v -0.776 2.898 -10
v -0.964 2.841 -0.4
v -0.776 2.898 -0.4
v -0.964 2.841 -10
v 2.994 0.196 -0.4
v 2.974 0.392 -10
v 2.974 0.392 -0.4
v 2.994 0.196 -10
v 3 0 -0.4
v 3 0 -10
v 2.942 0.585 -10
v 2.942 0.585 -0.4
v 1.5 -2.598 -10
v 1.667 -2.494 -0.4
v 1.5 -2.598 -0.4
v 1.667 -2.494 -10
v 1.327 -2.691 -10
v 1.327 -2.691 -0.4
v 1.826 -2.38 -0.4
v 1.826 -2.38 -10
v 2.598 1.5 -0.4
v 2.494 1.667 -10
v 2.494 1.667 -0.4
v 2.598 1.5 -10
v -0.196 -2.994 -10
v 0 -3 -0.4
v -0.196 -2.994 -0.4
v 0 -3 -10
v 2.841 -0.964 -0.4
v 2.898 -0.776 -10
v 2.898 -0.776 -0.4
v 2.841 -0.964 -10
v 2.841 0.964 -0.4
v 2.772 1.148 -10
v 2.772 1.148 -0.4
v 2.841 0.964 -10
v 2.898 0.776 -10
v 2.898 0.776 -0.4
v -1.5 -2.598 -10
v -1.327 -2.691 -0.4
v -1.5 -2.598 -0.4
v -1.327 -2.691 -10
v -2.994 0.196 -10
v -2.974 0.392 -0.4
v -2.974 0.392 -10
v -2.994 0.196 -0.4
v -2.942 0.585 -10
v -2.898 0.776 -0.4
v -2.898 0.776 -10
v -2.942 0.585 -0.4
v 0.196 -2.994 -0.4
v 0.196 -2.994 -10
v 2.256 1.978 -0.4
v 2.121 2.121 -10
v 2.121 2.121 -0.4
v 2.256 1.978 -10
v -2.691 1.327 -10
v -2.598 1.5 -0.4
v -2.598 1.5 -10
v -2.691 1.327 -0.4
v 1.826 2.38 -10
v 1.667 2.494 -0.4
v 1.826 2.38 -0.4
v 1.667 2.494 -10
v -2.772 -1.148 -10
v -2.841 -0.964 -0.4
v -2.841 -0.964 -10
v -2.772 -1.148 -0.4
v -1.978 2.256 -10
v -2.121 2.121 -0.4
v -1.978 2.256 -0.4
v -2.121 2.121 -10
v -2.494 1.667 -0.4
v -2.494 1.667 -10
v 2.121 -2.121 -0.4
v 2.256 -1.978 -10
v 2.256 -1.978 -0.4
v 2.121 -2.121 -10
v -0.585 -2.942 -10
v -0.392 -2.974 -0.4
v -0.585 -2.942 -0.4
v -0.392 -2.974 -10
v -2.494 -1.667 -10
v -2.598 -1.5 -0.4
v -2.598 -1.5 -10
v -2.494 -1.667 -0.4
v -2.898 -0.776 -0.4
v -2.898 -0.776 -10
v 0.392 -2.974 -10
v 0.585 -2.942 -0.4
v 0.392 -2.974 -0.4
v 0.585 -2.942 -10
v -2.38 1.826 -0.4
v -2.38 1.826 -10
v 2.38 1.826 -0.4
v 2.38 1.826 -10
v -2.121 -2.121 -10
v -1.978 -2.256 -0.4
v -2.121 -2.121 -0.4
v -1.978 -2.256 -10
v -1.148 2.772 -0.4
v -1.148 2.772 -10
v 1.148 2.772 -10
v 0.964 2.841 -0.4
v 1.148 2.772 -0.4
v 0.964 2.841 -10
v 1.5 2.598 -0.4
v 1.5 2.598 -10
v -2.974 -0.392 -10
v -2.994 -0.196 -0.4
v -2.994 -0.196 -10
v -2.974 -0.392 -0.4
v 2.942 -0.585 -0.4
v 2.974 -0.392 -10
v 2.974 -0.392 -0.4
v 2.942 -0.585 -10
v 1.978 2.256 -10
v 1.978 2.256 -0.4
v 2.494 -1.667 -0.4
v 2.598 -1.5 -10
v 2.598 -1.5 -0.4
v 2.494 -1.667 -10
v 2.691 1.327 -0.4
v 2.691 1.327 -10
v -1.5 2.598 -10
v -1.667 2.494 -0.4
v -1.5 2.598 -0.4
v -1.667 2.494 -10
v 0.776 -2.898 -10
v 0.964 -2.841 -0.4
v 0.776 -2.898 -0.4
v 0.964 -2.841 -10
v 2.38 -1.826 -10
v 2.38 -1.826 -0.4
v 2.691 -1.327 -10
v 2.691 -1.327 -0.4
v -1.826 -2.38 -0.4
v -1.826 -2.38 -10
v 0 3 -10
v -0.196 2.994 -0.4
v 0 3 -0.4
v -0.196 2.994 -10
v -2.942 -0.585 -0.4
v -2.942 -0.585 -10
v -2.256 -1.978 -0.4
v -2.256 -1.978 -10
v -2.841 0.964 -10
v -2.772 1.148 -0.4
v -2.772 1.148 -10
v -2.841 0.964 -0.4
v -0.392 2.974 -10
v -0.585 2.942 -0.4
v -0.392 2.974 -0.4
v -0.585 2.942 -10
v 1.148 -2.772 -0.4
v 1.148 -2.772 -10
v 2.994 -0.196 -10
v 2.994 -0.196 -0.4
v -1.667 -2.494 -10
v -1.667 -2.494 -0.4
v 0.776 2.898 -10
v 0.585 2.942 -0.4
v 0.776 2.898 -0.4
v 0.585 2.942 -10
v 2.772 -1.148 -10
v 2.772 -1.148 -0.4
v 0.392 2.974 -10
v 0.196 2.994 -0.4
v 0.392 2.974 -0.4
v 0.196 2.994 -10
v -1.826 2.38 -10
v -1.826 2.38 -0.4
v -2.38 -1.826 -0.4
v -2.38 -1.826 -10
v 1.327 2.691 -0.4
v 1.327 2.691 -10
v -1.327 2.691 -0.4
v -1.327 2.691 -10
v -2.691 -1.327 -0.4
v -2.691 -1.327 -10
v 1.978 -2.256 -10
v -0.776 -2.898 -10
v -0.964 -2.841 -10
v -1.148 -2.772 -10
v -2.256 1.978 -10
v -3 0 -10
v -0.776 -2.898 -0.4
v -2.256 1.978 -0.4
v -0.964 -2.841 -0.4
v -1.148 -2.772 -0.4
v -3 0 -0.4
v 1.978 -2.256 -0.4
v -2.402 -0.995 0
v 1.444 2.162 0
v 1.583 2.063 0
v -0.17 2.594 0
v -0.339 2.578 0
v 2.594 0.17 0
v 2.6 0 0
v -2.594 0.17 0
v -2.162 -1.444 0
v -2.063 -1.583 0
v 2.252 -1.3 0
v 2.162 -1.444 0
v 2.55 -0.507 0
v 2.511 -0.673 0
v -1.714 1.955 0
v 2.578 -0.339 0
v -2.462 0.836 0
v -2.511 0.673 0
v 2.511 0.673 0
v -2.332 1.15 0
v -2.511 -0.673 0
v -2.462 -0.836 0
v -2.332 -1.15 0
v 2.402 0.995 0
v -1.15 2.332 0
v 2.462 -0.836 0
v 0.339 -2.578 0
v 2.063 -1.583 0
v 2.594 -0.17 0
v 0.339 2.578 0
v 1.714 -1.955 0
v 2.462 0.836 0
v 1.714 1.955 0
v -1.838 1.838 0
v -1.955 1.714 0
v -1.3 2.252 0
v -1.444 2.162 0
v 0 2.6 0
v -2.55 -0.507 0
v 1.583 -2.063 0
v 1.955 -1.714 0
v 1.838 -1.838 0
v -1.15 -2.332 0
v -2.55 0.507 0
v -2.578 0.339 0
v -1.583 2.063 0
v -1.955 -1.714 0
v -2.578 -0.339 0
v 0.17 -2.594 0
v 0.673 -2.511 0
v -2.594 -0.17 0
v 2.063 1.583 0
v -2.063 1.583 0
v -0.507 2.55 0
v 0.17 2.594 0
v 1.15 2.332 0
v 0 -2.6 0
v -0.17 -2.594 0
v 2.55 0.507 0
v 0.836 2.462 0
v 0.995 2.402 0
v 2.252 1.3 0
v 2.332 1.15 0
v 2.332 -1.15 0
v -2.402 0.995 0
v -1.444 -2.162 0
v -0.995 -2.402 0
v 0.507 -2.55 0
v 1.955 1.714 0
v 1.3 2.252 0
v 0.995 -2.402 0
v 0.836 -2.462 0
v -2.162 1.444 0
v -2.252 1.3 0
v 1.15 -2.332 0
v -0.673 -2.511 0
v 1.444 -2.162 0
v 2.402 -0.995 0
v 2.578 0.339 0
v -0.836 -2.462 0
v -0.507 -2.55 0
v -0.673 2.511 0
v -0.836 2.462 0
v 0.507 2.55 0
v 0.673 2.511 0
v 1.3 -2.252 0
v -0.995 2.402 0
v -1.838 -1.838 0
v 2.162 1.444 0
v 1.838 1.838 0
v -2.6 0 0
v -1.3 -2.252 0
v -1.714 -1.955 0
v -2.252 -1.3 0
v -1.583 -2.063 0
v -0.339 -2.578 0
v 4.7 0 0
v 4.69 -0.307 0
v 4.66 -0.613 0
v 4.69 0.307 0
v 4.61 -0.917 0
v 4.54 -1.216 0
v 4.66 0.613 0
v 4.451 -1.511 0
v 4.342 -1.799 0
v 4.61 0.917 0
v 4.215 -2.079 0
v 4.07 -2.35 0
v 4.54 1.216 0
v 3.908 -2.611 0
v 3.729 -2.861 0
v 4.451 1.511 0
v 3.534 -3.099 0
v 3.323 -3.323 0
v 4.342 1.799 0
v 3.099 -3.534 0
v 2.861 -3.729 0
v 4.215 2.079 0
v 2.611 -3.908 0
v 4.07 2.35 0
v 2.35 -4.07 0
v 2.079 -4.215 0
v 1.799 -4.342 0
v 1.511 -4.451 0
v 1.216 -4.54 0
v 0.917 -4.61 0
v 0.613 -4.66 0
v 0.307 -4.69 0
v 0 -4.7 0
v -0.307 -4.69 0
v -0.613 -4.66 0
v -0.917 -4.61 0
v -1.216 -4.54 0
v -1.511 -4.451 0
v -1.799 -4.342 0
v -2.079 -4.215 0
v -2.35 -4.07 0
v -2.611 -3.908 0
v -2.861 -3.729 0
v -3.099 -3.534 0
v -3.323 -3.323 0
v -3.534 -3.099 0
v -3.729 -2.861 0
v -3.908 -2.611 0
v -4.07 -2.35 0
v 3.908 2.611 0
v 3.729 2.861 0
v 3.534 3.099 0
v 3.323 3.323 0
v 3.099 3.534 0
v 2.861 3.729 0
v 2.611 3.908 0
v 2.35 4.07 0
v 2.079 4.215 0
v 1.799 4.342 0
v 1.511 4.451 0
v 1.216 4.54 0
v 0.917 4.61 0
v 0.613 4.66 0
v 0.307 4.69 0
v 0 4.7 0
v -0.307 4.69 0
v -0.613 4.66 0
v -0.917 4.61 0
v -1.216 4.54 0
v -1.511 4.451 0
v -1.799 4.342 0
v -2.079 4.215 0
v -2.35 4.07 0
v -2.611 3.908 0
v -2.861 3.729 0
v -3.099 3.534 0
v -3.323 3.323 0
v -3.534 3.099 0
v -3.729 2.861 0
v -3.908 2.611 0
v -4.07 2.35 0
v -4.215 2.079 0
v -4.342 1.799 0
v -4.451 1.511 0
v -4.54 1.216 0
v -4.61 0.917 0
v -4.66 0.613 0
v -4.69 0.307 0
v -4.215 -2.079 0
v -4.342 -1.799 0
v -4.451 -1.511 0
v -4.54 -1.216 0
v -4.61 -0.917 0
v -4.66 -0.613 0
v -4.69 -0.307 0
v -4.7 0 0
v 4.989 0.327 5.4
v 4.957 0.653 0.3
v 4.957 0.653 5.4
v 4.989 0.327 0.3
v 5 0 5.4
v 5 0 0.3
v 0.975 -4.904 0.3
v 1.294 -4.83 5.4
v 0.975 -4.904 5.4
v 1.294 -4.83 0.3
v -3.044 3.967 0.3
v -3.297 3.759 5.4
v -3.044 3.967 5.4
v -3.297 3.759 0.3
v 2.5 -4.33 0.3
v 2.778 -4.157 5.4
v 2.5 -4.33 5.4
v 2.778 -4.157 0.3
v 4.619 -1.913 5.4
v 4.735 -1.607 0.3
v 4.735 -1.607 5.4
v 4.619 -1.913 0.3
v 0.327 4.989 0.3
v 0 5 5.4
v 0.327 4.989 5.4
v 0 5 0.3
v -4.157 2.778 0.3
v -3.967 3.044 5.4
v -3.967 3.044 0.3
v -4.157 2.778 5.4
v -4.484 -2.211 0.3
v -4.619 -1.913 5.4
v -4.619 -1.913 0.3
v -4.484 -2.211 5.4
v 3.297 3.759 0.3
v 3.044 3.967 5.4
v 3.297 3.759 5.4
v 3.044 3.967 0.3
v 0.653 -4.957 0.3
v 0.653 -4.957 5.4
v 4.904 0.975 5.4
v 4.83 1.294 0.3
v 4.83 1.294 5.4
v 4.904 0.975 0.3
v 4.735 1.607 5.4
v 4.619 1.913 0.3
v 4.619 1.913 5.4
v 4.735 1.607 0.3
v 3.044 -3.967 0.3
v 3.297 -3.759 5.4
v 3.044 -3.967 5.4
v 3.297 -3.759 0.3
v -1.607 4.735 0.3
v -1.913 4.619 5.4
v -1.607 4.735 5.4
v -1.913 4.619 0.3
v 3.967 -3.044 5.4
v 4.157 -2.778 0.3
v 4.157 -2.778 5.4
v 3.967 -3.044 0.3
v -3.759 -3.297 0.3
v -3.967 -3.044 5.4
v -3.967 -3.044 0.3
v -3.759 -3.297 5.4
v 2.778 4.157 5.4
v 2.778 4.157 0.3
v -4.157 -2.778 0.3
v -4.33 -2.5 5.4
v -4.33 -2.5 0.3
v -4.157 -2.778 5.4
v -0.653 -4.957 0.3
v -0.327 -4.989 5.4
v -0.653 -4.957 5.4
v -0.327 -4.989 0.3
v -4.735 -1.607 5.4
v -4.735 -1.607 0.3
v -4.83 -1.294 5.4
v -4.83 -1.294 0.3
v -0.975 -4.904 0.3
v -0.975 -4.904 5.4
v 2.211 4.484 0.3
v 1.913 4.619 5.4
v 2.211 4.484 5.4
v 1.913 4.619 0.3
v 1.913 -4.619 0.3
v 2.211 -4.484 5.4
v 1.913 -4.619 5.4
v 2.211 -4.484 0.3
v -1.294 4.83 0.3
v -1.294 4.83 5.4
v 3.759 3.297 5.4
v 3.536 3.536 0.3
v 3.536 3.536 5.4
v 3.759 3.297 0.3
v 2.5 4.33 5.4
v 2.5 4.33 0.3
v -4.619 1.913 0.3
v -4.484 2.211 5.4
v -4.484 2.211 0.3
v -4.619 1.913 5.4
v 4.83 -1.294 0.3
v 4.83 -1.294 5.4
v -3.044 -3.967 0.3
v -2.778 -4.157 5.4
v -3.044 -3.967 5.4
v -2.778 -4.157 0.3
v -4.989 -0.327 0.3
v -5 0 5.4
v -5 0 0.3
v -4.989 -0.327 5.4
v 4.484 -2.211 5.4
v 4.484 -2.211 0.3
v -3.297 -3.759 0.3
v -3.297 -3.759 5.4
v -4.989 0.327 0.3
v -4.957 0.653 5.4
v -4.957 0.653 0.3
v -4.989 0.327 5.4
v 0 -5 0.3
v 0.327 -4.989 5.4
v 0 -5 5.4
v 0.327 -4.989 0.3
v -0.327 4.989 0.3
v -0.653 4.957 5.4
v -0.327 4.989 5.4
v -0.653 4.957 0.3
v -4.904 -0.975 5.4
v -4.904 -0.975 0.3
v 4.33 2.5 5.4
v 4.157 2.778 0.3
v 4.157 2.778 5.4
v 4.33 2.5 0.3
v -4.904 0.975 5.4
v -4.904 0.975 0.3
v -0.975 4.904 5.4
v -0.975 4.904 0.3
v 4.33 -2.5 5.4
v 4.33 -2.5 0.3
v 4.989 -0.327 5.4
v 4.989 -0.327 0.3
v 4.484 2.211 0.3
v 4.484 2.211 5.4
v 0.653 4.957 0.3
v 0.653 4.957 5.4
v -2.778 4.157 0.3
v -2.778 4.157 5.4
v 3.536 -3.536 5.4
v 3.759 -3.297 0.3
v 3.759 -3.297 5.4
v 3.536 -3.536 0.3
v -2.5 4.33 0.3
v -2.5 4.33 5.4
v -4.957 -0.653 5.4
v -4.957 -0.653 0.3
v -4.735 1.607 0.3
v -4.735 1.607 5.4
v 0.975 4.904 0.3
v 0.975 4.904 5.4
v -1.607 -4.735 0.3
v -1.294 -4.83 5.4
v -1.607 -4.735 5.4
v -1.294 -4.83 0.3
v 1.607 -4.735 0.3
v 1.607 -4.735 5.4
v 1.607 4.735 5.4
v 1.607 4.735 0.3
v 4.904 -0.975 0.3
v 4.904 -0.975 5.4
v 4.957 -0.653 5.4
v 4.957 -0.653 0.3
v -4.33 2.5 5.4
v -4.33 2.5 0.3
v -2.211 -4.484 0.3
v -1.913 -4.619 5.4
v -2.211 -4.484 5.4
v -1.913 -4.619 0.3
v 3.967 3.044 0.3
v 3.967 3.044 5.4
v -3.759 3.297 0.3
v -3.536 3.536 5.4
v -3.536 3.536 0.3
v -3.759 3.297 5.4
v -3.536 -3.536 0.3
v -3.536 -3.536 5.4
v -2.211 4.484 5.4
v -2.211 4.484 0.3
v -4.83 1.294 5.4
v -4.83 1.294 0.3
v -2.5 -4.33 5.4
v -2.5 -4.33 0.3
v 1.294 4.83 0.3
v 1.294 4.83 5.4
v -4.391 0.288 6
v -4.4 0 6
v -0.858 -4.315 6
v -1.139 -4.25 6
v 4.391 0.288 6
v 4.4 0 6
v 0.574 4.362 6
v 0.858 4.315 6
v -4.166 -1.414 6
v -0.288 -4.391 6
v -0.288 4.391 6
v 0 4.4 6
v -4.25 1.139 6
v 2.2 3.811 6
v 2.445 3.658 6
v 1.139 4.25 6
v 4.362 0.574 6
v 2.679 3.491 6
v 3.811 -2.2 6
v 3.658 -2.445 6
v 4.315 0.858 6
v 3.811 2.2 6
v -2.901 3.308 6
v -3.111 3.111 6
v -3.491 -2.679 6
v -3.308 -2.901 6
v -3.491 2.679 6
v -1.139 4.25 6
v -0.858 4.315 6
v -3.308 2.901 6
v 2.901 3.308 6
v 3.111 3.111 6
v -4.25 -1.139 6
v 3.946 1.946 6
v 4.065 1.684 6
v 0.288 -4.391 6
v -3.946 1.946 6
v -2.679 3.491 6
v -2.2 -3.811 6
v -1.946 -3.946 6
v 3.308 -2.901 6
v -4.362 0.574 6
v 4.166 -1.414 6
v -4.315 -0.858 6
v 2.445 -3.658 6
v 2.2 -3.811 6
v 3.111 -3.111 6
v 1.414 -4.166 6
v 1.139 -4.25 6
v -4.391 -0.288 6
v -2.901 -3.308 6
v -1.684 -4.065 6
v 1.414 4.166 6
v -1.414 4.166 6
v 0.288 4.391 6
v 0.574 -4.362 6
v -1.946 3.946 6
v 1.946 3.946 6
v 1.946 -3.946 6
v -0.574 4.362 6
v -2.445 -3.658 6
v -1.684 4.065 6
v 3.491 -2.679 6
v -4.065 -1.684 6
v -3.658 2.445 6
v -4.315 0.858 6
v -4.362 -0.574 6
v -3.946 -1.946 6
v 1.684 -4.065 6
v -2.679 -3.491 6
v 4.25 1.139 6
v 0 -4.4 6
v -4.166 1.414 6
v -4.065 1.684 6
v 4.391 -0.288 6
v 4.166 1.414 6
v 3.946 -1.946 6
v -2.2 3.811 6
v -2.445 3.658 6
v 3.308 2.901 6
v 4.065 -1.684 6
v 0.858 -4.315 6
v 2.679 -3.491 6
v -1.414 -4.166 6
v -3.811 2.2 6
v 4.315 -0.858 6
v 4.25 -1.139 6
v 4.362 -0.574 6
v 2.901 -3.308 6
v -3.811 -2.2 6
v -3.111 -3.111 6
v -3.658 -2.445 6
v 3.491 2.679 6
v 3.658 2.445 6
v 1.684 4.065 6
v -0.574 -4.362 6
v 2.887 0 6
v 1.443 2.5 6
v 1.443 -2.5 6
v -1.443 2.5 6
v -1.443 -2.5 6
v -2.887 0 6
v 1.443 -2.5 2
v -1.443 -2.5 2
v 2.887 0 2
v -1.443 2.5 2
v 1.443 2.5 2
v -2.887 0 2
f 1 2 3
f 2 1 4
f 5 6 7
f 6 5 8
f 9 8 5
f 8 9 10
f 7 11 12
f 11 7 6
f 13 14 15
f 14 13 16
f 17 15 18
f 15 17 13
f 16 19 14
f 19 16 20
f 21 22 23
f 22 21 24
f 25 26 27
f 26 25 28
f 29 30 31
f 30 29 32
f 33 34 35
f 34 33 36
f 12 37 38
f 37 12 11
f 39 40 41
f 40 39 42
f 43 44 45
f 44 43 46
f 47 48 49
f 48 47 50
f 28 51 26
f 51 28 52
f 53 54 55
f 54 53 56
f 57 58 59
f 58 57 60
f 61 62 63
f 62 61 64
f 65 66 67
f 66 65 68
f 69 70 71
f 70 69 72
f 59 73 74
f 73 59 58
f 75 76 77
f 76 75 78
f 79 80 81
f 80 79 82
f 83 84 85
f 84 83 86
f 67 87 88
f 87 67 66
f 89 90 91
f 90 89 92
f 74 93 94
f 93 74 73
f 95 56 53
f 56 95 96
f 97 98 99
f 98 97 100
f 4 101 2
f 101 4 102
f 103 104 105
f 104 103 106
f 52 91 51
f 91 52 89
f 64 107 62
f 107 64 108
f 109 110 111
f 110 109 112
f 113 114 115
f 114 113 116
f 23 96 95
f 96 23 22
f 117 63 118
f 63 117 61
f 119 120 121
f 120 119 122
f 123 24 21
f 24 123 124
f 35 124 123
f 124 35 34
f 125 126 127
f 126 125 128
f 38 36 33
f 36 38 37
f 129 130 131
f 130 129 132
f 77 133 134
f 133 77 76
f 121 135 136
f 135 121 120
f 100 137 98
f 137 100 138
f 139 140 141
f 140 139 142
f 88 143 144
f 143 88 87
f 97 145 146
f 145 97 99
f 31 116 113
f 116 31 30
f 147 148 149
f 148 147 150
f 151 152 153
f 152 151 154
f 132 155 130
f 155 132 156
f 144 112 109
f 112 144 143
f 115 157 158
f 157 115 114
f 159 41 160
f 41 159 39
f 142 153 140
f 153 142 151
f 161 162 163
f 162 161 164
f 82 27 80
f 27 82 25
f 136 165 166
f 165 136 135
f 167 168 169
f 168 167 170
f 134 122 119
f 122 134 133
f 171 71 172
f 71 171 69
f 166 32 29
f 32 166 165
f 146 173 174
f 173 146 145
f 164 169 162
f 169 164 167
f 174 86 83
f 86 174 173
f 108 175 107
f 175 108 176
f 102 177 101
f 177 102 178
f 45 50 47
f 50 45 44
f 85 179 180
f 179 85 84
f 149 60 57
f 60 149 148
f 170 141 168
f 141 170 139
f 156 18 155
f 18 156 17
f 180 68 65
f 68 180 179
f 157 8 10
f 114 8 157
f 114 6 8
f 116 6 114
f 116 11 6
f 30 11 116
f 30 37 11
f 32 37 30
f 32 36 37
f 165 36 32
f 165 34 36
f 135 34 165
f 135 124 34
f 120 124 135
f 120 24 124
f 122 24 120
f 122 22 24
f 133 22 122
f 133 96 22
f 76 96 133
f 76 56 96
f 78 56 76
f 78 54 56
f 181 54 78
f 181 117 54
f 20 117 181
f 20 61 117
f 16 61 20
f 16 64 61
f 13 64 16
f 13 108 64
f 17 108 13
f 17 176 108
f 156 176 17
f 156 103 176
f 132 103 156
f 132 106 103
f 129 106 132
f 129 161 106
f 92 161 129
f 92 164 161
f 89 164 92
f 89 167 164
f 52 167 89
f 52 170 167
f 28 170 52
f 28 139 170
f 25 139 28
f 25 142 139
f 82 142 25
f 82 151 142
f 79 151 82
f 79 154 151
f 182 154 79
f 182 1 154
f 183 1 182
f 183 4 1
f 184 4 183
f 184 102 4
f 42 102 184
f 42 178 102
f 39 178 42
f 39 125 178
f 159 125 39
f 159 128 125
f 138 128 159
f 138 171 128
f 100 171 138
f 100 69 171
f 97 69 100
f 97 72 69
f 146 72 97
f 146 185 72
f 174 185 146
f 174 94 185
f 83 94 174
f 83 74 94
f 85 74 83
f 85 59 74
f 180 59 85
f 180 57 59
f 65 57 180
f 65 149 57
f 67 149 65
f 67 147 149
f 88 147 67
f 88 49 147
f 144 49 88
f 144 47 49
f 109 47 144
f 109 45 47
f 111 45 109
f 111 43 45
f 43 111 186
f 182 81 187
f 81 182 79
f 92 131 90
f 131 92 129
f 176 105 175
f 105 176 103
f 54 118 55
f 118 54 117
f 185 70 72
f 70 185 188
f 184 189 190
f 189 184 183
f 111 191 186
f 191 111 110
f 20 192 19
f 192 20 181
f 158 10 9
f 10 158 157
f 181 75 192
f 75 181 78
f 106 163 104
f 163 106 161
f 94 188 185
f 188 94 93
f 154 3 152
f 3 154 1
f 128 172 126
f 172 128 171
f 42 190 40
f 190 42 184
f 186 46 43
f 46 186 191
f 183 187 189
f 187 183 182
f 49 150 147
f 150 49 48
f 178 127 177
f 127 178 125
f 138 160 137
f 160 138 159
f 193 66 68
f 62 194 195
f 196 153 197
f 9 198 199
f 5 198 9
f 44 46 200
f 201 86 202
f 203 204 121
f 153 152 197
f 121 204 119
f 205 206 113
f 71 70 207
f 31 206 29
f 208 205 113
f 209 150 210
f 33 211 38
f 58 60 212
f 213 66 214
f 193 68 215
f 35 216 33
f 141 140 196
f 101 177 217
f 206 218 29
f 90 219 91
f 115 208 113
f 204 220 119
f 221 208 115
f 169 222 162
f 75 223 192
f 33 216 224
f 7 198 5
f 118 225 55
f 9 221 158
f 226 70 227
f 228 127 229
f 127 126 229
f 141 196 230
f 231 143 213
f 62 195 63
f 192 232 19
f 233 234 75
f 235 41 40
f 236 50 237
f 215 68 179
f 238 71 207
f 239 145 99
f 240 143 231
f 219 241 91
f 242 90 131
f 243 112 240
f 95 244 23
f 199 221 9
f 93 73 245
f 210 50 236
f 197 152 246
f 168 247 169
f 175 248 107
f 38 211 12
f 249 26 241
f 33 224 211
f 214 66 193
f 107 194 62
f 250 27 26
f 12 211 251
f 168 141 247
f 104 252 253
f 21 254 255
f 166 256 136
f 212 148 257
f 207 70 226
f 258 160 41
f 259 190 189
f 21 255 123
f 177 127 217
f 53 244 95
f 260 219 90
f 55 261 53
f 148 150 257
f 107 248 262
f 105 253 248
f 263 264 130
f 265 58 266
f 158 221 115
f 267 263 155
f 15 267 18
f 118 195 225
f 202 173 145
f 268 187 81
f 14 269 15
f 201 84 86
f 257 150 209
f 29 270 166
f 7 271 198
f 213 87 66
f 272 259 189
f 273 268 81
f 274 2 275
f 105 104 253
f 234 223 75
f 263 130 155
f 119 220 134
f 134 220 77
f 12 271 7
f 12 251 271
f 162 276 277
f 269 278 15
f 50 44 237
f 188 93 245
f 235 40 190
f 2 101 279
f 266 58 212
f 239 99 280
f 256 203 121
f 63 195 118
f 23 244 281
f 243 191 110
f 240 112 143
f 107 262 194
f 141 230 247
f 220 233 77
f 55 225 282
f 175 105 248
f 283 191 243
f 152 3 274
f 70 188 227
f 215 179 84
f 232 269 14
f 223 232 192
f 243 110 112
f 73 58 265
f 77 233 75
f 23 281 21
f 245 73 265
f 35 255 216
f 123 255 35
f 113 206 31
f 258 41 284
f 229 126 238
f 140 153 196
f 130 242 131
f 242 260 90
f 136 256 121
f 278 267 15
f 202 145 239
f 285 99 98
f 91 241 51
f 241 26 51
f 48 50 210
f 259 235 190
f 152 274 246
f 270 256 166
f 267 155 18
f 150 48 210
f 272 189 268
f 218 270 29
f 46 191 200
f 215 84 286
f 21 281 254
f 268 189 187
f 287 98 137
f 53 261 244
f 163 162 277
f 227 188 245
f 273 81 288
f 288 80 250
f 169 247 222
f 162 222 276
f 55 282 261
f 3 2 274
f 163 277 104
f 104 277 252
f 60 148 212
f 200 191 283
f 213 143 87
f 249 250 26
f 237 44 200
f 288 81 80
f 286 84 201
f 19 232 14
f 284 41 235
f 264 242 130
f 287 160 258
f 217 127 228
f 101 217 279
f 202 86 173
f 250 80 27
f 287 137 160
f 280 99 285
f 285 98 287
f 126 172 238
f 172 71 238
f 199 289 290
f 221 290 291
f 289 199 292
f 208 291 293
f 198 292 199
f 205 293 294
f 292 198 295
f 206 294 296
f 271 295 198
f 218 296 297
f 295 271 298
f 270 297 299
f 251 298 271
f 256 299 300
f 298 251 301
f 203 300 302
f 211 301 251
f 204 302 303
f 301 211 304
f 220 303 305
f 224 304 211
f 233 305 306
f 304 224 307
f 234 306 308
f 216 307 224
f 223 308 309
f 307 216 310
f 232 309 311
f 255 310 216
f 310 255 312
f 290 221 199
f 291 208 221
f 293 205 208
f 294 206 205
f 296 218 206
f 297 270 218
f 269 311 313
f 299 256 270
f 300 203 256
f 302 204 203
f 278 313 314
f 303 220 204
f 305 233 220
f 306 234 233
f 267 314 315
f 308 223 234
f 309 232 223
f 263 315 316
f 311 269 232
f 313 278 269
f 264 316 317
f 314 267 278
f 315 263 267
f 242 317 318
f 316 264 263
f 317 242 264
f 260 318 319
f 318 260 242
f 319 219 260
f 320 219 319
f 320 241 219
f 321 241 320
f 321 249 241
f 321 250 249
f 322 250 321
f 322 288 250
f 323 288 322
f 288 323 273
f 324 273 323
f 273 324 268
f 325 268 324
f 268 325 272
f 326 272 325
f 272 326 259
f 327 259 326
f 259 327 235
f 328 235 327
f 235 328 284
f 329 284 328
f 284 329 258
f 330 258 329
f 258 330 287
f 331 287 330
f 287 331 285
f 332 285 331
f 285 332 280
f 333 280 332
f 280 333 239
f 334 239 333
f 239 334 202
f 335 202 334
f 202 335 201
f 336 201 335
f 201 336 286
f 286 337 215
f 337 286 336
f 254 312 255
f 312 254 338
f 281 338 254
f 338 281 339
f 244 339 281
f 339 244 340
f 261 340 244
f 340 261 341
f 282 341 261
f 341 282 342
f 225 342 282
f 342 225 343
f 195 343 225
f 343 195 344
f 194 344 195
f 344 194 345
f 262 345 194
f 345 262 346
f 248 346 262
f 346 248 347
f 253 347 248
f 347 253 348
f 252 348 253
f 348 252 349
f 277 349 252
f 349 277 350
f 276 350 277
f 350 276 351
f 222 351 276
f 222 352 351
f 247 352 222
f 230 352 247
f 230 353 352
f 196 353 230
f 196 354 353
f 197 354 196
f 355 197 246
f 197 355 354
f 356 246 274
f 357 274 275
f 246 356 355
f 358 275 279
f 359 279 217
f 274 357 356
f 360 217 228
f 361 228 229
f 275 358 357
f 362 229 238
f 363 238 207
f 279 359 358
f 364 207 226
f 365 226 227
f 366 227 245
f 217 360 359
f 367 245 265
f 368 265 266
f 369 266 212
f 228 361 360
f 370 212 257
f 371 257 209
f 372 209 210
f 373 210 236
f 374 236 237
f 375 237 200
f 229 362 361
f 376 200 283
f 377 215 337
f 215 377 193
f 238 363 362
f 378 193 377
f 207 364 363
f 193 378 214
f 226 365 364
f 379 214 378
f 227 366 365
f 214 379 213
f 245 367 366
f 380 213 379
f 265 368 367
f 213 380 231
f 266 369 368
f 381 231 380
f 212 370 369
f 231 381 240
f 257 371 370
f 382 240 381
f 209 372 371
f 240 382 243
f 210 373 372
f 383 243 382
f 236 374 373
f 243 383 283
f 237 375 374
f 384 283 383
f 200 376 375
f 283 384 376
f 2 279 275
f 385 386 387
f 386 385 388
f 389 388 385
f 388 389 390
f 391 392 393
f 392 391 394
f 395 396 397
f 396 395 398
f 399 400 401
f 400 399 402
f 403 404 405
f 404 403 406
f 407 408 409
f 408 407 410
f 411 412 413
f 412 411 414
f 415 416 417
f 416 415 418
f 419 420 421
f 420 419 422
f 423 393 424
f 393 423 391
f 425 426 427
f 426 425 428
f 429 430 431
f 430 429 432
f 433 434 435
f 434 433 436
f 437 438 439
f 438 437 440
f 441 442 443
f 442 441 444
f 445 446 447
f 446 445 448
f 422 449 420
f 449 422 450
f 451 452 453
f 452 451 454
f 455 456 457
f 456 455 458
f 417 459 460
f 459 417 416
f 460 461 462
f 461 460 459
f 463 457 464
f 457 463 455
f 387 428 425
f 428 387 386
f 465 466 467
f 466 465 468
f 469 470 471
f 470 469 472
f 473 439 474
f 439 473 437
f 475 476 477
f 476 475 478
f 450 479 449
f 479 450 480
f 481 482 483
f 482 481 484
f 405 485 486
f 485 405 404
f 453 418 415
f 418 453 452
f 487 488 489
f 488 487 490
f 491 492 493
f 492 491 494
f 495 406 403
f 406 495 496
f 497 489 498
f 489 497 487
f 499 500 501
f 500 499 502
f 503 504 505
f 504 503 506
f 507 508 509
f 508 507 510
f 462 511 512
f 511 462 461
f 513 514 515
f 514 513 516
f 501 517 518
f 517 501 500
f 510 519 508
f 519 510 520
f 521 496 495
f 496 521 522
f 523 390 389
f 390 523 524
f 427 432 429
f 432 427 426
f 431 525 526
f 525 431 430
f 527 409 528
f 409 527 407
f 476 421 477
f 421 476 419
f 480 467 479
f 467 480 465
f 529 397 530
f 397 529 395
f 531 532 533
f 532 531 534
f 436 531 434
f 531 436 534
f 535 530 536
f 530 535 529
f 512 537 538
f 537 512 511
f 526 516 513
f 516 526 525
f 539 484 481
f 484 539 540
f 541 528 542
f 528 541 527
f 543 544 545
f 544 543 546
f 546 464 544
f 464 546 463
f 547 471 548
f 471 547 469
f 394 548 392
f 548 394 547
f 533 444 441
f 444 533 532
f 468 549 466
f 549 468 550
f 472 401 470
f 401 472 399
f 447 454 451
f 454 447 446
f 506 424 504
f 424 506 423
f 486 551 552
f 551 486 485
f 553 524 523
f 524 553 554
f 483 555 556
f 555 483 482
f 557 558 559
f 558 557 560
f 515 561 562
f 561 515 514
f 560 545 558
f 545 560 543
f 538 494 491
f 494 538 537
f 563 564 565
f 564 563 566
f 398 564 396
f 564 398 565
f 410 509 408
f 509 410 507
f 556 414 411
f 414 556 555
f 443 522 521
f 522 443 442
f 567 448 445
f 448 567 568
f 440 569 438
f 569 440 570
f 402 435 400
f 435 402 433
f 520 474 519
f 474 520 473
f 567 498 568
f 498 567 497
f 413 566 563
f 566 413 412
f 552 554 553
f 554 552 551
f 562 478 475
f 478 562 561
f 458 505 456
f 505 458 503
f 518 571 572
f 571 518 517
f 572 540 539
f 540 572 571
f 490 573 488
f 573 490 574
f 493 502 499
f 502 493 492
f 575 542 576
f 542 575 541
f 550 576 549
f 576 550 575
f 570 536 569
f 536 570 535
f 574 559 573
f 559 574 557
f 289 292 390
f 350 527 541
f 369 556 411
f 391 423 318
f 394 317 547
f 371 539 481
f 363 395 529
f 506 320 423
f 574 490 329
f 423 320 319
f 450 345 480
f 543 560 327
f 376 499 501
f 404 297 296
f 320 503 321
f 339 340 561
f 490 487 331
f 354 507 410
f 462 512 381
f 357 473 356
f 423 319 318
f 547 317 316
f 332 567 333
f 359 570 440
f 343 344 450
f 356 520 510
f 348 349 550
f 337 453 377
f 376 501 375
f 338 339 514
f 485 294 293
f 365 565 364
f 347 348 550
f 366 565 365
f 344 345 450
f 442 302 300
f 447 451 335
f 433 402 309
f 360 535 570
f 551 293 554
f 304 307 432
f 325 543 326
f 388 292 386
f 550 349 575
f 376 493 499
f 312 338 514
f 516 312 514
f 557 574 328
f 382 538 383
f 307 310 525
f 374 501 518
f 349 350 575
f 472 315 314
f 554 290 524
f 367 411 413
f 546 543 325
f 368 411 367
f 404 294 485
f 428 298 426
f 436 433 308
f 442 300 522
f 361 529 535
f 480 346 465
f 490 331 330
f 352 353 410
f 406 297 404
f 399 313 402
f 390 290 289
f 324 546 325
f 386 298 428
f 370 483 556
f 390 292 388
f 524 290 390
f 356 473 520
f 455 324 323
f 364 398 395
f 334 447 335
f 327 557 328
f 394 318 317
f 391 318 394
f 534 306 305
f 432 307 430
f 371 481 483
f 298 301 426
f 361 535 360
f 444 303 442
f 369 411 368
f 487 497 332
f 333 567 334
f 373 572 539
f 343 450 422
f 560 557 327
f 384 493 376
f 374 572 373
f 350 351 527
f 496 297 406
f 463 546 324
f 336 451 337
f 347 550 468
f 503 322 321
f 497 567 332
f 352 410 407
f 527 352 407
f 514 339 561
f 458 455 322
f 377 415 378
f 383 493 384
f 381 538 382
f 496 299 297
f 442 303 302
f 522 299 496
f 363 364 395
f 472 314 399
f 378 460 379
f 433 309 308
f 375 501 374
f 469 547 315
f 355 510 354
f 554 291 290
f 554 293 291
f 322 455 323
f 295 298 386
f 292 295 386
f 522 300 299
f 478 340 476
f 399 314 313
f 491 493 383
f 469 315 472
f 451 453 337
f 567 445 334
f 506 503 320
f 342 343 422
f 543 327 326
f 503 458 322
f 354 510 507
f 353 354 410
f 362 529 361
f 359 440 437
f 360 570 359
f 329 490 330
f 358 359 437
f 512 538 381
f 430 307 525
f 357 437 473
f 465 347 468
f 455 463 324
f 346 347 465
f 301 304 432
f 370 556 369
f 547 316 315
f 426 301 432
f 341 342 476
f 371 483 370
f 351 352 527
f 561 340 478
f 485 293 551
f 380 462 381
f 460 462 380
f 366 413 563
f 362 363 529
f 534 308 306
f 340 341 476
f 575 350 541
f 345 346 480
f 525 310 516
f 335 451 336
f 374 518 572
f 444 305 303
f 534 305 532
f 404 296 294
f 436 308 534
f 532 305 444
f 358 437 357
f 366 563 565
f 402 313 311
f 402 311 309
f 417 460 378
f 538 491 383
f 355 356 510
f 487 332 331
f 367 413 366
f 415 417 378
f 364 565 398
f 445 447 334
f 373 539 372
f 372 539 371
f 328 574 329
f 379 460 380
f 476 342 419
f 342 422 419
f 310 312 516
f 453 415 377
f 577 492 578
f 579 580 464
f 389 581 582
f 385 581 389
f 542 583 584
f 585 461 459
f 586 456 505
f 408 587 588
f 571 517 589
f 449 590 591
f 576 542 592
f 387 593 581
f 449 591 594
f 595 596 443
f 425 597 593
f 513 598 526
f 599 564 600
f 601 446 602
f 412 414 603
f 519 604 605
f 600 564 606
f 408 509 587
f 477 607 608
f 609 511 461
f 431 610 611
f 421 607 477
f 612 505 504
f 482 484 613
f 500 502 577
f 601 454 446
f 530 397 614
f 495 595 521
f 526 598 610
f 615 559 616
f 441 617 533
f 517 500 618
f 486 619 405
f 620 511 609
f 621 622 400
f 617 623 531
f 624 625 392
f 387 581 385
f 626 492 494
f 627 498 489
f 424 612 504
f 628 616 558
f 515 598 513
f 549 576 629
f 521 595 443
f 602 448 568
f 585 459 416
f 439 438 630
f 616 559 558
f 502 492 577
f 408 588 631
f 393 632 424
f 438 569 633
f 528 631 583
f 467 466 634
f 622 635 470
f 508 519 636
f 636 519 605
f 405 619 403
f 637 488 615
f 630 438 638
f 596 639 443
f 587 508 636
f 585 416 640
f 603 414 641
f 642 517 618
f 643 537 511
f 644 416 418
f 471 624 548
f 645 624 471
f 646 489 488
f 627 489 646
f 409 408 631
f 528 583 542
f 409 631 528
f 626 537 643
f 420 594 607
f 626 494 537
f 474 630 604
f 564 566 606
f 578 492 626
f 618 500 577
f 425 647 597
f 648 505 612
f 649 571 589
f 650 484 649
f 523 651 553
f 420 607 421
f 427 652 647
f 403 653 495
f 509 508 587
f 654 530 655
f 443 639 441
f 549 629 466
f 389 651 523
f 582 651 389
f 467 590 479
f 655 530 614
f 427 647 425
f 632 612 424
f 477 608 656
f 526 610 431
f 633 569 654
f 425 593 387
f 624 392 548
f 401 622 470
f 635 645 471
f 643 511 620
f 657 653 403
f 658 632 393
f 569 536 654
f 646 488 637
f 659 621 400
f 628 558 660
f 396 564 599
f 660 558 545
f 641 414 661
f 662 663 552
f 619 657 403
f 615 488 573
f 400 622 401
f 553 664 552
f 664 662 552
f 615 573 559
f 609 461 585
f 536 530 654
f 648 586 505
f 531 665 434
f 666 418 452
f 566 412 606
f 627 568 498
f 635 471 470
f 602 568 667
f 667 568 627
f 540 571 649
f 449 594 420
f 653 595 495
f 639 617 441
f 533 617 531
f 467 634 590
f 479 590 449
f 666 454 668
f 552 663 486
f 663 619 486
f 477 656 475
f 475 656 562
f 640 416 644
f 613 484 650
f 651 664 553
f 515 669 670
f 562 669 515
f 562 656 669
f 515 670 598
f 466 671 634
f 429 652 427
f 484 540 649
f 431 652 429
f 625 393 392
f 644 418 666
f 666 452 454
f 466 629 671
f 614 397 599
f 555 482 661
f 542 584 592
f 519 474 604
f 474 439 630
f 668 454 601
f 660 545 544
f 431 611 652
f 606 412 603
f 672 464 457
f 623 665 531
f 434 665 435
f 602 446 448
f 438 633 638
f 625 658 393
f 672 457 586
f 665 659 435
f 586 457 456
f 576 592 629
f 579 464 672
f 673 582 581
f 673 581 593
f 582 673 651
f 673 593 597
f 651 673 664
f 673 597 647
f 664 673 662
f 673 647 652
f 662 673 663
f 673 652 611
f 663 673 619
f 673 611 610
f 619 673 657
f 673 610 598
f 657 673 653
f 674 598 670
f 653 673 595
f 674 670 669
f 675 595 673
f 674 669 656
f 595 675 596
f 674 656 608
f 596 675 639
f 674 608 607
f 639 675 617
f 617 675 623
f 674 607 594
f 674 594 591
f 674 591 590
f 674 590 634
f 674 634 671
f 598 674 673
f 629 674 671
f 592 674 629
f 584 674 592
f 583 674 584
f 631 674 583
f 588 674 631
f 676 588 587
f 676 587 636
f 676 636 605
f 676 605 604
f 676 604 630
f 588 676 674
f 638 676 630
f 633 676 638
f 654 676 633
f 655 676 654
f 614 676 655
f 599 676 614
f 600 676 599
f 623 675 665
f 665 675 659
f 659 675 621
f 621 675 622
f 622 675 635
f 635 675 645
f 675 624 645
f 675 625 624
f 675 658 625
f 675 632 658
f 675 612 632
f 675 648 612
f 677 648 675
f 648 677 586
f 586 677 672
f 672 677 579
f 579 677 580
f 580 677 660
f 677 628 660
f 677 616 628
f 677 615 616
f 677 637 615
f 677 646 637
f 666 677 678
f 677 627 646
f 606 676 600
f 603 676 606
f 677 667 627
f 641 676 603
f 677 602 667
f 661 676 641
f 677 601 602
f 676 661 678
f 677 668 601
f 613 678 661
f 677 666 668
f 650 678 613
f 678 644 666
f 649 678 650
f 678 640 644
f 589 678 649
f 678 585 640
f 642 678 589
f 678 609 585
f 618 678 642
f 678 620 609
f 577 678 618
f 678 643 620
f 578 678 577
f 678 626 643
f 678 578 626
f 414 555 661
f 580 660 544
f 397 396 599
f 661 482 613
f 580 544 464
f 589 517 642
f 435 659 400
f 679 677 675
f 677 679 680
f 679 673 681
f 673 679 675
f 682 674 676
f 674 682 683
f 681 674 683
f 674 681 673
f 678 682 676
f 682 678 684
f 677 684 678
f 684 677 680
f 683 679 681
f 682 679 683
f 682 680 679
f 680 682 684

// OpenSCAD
$fn = 96;

// Socket head cap screw (approx. ISO 4762)
// Given: shank diameter 6.0mm, head diameter 10.0mm, head height 6.0mm, length 10mm (under head)

d_shank = 6.0;
l_shank = 10.0;

d_head  = 10.0;
h_head  = 6.0;

// Hex socket (approx for M6): across flats ~5mm, depth ~4mm
af_socket = 5.0;
depth_socket = 4.0;

// Small edge chamfers
chamfer_head_top = 0.6;
chamfer_head_bottom = 0.3;
chamfer_shank_end = 0.4;

module hex_prism_across_flats(af, h) {
    // For a regular hexagon, across flats = 2 * apothem = sqrt(3) * R
    // So circumradius R = af / sqrt(3)
    R = af / sqrt(3);
    cylinder(h=h, r=R, $fn=6);
}

module socket_head_cap_screw() {
    difference() {
        union() {
            // Shank (under head), with slight chamfer at free end
            translate([0,0,-l_shank])
            union() {
                cylinder(h=l_shank - chamfer_shank_end, d=d_shank);
                translate([0,0,l_shank - chamfer_shank_end])
                    cylinder(h=chamfer_shank_end, d1=d_shank, d2=d_shank - 2*chamfer_shank_end);
            }

            // Head with small bottom chamfer and top chamfer
            union() {
                // Main head body
                translate([0,0,chamfer_head_bottom])
                    cylinder(h=h_head - chamfer_head_bottom - chamfer_head_top, d=d_head);

                // Bottom chamfer (toward shank)
                cylinder(h=chamfer_head_bottom, d1=d_head - 2*chamfer_head_bottom, d2=d_head);

                // Top chamfer
                translate([0,0,h_head - chamfer_head_top])
                    cylinder(h=chamfer_head_top, d1=d_head, d2=d_head - 2*chamfer_head_top);
            }
        }

        // Hex socket cut
        translate([0,0,h_head - depth_socket])
            hex_prism_across_flats(af_socket, depth_socket + 0.2);
    }
}

socket_head_cap_screw();
